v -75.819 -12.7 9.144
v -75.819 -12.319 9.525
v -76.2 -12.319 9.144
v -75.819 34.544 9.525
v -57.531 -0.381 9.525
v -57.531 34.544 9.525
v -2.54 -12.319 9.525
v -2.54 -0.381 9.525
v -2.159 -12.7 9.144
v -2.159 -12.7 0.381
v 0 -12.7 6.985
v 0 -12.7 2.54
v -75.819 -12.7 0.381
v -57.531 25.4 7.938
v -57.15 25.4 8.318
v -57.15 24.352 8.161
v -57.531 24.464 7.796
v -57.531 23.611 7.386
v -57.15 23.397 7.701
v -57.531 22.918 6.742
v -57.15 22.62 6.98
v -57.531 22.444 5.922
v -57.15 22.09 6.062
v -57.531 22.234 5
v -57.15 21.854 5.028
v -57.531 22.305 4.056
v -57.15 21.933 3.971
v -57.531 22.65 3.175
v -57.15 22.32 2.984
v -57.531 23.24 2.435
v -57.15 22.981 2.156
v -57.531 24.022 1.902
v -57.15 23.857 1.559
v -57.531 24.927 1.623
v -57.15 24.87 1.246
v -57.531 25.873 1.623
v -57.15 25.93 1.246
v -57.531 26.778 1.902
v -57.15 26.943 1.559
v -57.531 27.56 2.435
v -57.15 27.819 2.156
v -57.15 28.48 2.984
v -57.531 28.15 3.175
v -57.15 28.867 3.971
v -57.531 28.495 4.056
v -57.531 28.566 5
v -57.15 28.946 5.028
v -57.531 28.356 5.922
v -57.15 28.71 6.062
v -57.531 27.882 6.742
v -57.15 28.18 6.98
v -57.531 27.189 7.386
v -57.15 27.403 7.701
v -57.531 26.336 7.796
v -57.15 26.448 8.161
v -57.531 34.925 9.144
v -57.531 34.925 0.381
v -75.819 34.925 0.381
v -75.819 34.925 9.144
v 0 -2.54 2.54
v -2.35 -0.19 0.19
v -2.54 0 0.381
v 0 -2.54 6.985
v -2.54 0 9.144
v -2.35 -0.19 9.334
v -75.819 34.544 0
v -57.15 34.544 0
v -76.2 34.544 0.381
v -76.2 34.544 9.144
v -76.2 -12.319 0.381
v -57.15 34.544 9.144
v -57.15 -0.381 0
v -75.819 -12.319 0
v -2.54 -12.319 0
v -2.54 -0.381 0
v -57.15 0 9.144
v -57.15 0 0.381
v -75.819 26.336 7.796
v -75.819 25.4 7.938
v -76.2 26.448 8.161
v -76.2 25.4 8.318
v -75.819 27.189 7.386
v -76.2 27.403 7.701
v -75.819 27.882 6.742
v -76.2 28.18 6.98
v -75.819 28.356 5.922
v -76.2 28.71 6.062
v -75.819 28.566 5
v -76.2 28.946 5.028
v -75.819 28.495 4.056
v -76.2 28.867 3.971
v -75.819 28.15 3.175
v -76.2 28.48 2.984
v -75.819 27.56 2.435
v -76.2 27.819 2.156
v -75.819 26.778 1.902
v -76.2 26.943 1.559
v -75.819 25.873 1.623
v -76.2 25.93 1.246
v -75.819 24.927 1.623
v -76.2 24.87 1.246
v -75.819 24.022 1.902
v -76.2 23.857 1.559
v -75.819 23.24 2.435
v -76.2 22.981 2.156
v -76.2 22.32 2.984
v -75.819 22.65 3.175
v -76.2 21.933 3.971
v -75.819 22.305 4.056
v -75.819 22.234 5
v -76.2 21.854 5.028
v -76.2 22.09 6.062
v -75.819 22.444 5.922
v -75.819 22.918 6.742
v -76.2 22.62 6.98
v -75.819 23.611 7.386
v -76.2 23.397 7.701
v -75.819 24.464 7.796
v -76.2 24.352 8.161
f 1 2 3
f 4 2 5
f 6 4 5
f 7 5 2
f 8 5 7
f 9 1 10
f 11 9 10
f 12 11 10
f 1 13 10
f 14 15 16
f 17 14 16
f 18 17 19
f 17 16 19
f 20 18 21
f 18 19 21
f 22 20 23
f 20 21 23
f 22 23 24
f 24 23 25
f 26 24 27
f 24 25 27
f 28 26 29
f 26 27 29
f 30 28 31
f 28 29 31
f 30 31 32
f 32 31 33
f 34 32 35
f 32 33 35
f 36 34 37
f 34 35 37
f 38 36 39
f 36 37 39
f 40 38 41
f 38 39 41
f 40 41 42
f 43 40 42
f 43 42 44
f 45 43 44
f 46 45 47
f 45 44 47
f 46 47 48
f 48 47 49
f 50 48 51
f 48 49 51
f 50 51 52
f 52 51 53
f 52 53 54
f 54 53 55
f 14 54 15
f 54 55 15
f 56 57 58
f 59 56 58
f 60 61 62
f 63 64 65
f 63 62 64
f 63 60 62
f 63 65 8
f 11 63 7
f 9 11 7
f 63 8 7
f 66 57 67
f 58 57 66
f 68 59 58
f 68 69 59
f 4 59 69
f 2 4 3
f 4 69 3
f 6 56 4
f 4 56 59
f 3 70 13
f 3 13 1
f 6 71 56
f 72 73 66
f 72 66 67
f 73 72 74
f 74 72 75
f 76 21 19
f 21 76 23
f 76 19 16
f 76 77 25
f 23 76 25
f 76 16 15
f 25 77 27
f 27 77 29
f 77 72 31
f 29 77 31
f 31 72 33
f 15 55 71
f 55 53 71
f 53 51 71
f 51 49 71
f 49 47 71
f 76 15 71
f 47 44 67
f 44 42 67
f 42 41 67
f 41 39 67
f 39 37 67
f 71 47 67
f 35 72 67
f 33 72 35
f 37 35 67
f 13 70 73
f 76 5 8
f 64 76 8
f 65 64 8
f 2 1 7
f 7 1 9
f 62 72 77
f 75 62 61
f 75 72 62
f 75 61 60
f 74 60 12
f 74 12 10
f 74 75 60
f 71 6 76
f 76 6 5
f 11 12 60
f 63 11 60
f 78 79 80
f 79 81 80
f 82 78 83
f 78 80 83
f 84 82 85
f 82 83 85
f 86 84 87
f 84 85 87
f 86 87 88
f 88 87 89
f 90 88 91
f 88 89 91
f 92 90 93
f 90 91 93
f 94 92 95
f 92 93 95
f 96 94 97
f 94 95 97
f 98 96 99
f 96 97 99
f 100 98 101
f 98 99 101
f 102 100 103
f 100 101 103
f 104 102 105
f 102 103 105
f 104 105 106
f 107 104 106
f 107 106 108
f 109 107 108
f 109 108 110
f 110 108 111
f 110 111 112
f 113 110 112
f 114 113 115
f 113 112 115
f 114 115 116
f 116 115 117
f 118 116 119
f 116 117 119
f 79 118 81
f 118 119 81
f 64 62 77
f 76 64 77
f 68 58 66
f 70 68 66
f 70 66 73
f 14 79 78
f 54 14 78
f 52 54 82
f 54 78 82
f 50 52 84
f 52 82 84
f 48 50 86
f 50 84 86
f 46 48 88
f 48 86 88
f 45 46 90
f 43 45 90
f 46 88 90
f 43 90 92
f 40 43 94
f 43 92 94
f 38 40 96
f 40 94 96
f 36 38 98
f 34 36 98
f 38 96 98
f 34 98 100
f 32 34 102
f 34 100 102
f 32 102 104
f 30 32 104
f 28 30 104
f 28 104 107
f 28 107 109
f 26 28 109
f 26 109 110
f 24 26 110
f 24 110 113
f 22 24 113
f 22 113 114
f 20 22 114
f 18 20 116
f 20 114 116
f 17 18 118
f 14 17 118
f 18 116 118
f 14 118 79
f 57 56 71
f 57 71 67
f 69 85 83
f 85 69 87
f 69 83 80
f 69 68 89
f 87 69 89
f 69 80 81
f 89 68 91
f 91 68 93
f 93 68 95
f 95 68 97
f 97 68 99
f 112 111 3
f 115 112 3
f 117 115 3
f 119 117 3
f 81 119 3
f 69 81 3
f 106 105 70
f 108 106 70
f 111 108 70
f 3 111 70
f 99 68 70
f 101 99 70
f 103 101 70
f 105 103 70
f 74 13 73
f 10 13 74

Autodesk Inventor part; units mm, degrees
ref_plane "YZ Plane" through (0, 0, 0) normal (1, 0, 0) x (0, 1, 0)
ref_plane "XZ Plane" through (0, 0, 0) normal (0, 1, 0) x (-1, 0, 0)
ref_plane "XY Plane" through (0, 0, 0) normal (0, 0, 1) x (1, 0, 0)
sketch "Sketch1" plane through (0, 0, 0) normal (0, 0, 1) x (1, 0, 0)
  line L0 (-57.15, 34.925) -> (-76.2, 34.925)
  line L1 (-76.2, 34.925) -> (-76.2, -12.7)
  line L2 (-76.2, -12.7) -> (0, -12.7)
  line L3 (0, -12.7) -> (0, 0)
  line L4 (0, 0) -> (-57.15, 0)
  line L5 (-57.15, 0) -> (-57.15, 34.925)
extrude "Extrusion1" add sketch "Sketch1" along normal blind 9.525
chamfer "Chamfer4" distance 2.54 angle 45 3 edges at (0, 0, 4.7625) (0, -6.35, 9.525) (0, -6.35, 0)
chamfer "Chamfer2" distance 0.381 angle 45 12 edges at (-76.2, 34.925, 4.7625) (-57.15, 34.925, 4.7625) (-57.15, 17.4625, 9.525) (-66.675, 34.925, 9.525) (-66.675, 34.925, 0) (-76.2, 11.1125, 9.525) (-76.2, 11.1125, 0) (-29.845, 0, 9.525) (-29.845, 0, 0) (-39.37, -12.7, 9.525) (-76.2, -12.7, 4.7625) (-39.37, -12.7, 0)
sketch "Sketch2" plane through (-76.2, -12.319, 0.381) normal (-1, 0, 0) x (0, 0, 1)
  circle A0 centre (4.3815, 37.719) radius 3.175
  line L0 (-0.381, 46.863) -> (-0.381, 0) projected
  line L1 (8.763, 47.244) -> (0, 47.244) projected
  dimension "d6" = 4.7625
  dimension "d7" = 9.525
extrude "Extrusion2" cut sketch "Sketch2" against normal through all
chamfer "Chamfer3" distance 0.381 angle 45 2 edges at (-57.15, 25.4, 1.5875) (-76.2, 25.4, 1.5875)
properties part number "index finger"
